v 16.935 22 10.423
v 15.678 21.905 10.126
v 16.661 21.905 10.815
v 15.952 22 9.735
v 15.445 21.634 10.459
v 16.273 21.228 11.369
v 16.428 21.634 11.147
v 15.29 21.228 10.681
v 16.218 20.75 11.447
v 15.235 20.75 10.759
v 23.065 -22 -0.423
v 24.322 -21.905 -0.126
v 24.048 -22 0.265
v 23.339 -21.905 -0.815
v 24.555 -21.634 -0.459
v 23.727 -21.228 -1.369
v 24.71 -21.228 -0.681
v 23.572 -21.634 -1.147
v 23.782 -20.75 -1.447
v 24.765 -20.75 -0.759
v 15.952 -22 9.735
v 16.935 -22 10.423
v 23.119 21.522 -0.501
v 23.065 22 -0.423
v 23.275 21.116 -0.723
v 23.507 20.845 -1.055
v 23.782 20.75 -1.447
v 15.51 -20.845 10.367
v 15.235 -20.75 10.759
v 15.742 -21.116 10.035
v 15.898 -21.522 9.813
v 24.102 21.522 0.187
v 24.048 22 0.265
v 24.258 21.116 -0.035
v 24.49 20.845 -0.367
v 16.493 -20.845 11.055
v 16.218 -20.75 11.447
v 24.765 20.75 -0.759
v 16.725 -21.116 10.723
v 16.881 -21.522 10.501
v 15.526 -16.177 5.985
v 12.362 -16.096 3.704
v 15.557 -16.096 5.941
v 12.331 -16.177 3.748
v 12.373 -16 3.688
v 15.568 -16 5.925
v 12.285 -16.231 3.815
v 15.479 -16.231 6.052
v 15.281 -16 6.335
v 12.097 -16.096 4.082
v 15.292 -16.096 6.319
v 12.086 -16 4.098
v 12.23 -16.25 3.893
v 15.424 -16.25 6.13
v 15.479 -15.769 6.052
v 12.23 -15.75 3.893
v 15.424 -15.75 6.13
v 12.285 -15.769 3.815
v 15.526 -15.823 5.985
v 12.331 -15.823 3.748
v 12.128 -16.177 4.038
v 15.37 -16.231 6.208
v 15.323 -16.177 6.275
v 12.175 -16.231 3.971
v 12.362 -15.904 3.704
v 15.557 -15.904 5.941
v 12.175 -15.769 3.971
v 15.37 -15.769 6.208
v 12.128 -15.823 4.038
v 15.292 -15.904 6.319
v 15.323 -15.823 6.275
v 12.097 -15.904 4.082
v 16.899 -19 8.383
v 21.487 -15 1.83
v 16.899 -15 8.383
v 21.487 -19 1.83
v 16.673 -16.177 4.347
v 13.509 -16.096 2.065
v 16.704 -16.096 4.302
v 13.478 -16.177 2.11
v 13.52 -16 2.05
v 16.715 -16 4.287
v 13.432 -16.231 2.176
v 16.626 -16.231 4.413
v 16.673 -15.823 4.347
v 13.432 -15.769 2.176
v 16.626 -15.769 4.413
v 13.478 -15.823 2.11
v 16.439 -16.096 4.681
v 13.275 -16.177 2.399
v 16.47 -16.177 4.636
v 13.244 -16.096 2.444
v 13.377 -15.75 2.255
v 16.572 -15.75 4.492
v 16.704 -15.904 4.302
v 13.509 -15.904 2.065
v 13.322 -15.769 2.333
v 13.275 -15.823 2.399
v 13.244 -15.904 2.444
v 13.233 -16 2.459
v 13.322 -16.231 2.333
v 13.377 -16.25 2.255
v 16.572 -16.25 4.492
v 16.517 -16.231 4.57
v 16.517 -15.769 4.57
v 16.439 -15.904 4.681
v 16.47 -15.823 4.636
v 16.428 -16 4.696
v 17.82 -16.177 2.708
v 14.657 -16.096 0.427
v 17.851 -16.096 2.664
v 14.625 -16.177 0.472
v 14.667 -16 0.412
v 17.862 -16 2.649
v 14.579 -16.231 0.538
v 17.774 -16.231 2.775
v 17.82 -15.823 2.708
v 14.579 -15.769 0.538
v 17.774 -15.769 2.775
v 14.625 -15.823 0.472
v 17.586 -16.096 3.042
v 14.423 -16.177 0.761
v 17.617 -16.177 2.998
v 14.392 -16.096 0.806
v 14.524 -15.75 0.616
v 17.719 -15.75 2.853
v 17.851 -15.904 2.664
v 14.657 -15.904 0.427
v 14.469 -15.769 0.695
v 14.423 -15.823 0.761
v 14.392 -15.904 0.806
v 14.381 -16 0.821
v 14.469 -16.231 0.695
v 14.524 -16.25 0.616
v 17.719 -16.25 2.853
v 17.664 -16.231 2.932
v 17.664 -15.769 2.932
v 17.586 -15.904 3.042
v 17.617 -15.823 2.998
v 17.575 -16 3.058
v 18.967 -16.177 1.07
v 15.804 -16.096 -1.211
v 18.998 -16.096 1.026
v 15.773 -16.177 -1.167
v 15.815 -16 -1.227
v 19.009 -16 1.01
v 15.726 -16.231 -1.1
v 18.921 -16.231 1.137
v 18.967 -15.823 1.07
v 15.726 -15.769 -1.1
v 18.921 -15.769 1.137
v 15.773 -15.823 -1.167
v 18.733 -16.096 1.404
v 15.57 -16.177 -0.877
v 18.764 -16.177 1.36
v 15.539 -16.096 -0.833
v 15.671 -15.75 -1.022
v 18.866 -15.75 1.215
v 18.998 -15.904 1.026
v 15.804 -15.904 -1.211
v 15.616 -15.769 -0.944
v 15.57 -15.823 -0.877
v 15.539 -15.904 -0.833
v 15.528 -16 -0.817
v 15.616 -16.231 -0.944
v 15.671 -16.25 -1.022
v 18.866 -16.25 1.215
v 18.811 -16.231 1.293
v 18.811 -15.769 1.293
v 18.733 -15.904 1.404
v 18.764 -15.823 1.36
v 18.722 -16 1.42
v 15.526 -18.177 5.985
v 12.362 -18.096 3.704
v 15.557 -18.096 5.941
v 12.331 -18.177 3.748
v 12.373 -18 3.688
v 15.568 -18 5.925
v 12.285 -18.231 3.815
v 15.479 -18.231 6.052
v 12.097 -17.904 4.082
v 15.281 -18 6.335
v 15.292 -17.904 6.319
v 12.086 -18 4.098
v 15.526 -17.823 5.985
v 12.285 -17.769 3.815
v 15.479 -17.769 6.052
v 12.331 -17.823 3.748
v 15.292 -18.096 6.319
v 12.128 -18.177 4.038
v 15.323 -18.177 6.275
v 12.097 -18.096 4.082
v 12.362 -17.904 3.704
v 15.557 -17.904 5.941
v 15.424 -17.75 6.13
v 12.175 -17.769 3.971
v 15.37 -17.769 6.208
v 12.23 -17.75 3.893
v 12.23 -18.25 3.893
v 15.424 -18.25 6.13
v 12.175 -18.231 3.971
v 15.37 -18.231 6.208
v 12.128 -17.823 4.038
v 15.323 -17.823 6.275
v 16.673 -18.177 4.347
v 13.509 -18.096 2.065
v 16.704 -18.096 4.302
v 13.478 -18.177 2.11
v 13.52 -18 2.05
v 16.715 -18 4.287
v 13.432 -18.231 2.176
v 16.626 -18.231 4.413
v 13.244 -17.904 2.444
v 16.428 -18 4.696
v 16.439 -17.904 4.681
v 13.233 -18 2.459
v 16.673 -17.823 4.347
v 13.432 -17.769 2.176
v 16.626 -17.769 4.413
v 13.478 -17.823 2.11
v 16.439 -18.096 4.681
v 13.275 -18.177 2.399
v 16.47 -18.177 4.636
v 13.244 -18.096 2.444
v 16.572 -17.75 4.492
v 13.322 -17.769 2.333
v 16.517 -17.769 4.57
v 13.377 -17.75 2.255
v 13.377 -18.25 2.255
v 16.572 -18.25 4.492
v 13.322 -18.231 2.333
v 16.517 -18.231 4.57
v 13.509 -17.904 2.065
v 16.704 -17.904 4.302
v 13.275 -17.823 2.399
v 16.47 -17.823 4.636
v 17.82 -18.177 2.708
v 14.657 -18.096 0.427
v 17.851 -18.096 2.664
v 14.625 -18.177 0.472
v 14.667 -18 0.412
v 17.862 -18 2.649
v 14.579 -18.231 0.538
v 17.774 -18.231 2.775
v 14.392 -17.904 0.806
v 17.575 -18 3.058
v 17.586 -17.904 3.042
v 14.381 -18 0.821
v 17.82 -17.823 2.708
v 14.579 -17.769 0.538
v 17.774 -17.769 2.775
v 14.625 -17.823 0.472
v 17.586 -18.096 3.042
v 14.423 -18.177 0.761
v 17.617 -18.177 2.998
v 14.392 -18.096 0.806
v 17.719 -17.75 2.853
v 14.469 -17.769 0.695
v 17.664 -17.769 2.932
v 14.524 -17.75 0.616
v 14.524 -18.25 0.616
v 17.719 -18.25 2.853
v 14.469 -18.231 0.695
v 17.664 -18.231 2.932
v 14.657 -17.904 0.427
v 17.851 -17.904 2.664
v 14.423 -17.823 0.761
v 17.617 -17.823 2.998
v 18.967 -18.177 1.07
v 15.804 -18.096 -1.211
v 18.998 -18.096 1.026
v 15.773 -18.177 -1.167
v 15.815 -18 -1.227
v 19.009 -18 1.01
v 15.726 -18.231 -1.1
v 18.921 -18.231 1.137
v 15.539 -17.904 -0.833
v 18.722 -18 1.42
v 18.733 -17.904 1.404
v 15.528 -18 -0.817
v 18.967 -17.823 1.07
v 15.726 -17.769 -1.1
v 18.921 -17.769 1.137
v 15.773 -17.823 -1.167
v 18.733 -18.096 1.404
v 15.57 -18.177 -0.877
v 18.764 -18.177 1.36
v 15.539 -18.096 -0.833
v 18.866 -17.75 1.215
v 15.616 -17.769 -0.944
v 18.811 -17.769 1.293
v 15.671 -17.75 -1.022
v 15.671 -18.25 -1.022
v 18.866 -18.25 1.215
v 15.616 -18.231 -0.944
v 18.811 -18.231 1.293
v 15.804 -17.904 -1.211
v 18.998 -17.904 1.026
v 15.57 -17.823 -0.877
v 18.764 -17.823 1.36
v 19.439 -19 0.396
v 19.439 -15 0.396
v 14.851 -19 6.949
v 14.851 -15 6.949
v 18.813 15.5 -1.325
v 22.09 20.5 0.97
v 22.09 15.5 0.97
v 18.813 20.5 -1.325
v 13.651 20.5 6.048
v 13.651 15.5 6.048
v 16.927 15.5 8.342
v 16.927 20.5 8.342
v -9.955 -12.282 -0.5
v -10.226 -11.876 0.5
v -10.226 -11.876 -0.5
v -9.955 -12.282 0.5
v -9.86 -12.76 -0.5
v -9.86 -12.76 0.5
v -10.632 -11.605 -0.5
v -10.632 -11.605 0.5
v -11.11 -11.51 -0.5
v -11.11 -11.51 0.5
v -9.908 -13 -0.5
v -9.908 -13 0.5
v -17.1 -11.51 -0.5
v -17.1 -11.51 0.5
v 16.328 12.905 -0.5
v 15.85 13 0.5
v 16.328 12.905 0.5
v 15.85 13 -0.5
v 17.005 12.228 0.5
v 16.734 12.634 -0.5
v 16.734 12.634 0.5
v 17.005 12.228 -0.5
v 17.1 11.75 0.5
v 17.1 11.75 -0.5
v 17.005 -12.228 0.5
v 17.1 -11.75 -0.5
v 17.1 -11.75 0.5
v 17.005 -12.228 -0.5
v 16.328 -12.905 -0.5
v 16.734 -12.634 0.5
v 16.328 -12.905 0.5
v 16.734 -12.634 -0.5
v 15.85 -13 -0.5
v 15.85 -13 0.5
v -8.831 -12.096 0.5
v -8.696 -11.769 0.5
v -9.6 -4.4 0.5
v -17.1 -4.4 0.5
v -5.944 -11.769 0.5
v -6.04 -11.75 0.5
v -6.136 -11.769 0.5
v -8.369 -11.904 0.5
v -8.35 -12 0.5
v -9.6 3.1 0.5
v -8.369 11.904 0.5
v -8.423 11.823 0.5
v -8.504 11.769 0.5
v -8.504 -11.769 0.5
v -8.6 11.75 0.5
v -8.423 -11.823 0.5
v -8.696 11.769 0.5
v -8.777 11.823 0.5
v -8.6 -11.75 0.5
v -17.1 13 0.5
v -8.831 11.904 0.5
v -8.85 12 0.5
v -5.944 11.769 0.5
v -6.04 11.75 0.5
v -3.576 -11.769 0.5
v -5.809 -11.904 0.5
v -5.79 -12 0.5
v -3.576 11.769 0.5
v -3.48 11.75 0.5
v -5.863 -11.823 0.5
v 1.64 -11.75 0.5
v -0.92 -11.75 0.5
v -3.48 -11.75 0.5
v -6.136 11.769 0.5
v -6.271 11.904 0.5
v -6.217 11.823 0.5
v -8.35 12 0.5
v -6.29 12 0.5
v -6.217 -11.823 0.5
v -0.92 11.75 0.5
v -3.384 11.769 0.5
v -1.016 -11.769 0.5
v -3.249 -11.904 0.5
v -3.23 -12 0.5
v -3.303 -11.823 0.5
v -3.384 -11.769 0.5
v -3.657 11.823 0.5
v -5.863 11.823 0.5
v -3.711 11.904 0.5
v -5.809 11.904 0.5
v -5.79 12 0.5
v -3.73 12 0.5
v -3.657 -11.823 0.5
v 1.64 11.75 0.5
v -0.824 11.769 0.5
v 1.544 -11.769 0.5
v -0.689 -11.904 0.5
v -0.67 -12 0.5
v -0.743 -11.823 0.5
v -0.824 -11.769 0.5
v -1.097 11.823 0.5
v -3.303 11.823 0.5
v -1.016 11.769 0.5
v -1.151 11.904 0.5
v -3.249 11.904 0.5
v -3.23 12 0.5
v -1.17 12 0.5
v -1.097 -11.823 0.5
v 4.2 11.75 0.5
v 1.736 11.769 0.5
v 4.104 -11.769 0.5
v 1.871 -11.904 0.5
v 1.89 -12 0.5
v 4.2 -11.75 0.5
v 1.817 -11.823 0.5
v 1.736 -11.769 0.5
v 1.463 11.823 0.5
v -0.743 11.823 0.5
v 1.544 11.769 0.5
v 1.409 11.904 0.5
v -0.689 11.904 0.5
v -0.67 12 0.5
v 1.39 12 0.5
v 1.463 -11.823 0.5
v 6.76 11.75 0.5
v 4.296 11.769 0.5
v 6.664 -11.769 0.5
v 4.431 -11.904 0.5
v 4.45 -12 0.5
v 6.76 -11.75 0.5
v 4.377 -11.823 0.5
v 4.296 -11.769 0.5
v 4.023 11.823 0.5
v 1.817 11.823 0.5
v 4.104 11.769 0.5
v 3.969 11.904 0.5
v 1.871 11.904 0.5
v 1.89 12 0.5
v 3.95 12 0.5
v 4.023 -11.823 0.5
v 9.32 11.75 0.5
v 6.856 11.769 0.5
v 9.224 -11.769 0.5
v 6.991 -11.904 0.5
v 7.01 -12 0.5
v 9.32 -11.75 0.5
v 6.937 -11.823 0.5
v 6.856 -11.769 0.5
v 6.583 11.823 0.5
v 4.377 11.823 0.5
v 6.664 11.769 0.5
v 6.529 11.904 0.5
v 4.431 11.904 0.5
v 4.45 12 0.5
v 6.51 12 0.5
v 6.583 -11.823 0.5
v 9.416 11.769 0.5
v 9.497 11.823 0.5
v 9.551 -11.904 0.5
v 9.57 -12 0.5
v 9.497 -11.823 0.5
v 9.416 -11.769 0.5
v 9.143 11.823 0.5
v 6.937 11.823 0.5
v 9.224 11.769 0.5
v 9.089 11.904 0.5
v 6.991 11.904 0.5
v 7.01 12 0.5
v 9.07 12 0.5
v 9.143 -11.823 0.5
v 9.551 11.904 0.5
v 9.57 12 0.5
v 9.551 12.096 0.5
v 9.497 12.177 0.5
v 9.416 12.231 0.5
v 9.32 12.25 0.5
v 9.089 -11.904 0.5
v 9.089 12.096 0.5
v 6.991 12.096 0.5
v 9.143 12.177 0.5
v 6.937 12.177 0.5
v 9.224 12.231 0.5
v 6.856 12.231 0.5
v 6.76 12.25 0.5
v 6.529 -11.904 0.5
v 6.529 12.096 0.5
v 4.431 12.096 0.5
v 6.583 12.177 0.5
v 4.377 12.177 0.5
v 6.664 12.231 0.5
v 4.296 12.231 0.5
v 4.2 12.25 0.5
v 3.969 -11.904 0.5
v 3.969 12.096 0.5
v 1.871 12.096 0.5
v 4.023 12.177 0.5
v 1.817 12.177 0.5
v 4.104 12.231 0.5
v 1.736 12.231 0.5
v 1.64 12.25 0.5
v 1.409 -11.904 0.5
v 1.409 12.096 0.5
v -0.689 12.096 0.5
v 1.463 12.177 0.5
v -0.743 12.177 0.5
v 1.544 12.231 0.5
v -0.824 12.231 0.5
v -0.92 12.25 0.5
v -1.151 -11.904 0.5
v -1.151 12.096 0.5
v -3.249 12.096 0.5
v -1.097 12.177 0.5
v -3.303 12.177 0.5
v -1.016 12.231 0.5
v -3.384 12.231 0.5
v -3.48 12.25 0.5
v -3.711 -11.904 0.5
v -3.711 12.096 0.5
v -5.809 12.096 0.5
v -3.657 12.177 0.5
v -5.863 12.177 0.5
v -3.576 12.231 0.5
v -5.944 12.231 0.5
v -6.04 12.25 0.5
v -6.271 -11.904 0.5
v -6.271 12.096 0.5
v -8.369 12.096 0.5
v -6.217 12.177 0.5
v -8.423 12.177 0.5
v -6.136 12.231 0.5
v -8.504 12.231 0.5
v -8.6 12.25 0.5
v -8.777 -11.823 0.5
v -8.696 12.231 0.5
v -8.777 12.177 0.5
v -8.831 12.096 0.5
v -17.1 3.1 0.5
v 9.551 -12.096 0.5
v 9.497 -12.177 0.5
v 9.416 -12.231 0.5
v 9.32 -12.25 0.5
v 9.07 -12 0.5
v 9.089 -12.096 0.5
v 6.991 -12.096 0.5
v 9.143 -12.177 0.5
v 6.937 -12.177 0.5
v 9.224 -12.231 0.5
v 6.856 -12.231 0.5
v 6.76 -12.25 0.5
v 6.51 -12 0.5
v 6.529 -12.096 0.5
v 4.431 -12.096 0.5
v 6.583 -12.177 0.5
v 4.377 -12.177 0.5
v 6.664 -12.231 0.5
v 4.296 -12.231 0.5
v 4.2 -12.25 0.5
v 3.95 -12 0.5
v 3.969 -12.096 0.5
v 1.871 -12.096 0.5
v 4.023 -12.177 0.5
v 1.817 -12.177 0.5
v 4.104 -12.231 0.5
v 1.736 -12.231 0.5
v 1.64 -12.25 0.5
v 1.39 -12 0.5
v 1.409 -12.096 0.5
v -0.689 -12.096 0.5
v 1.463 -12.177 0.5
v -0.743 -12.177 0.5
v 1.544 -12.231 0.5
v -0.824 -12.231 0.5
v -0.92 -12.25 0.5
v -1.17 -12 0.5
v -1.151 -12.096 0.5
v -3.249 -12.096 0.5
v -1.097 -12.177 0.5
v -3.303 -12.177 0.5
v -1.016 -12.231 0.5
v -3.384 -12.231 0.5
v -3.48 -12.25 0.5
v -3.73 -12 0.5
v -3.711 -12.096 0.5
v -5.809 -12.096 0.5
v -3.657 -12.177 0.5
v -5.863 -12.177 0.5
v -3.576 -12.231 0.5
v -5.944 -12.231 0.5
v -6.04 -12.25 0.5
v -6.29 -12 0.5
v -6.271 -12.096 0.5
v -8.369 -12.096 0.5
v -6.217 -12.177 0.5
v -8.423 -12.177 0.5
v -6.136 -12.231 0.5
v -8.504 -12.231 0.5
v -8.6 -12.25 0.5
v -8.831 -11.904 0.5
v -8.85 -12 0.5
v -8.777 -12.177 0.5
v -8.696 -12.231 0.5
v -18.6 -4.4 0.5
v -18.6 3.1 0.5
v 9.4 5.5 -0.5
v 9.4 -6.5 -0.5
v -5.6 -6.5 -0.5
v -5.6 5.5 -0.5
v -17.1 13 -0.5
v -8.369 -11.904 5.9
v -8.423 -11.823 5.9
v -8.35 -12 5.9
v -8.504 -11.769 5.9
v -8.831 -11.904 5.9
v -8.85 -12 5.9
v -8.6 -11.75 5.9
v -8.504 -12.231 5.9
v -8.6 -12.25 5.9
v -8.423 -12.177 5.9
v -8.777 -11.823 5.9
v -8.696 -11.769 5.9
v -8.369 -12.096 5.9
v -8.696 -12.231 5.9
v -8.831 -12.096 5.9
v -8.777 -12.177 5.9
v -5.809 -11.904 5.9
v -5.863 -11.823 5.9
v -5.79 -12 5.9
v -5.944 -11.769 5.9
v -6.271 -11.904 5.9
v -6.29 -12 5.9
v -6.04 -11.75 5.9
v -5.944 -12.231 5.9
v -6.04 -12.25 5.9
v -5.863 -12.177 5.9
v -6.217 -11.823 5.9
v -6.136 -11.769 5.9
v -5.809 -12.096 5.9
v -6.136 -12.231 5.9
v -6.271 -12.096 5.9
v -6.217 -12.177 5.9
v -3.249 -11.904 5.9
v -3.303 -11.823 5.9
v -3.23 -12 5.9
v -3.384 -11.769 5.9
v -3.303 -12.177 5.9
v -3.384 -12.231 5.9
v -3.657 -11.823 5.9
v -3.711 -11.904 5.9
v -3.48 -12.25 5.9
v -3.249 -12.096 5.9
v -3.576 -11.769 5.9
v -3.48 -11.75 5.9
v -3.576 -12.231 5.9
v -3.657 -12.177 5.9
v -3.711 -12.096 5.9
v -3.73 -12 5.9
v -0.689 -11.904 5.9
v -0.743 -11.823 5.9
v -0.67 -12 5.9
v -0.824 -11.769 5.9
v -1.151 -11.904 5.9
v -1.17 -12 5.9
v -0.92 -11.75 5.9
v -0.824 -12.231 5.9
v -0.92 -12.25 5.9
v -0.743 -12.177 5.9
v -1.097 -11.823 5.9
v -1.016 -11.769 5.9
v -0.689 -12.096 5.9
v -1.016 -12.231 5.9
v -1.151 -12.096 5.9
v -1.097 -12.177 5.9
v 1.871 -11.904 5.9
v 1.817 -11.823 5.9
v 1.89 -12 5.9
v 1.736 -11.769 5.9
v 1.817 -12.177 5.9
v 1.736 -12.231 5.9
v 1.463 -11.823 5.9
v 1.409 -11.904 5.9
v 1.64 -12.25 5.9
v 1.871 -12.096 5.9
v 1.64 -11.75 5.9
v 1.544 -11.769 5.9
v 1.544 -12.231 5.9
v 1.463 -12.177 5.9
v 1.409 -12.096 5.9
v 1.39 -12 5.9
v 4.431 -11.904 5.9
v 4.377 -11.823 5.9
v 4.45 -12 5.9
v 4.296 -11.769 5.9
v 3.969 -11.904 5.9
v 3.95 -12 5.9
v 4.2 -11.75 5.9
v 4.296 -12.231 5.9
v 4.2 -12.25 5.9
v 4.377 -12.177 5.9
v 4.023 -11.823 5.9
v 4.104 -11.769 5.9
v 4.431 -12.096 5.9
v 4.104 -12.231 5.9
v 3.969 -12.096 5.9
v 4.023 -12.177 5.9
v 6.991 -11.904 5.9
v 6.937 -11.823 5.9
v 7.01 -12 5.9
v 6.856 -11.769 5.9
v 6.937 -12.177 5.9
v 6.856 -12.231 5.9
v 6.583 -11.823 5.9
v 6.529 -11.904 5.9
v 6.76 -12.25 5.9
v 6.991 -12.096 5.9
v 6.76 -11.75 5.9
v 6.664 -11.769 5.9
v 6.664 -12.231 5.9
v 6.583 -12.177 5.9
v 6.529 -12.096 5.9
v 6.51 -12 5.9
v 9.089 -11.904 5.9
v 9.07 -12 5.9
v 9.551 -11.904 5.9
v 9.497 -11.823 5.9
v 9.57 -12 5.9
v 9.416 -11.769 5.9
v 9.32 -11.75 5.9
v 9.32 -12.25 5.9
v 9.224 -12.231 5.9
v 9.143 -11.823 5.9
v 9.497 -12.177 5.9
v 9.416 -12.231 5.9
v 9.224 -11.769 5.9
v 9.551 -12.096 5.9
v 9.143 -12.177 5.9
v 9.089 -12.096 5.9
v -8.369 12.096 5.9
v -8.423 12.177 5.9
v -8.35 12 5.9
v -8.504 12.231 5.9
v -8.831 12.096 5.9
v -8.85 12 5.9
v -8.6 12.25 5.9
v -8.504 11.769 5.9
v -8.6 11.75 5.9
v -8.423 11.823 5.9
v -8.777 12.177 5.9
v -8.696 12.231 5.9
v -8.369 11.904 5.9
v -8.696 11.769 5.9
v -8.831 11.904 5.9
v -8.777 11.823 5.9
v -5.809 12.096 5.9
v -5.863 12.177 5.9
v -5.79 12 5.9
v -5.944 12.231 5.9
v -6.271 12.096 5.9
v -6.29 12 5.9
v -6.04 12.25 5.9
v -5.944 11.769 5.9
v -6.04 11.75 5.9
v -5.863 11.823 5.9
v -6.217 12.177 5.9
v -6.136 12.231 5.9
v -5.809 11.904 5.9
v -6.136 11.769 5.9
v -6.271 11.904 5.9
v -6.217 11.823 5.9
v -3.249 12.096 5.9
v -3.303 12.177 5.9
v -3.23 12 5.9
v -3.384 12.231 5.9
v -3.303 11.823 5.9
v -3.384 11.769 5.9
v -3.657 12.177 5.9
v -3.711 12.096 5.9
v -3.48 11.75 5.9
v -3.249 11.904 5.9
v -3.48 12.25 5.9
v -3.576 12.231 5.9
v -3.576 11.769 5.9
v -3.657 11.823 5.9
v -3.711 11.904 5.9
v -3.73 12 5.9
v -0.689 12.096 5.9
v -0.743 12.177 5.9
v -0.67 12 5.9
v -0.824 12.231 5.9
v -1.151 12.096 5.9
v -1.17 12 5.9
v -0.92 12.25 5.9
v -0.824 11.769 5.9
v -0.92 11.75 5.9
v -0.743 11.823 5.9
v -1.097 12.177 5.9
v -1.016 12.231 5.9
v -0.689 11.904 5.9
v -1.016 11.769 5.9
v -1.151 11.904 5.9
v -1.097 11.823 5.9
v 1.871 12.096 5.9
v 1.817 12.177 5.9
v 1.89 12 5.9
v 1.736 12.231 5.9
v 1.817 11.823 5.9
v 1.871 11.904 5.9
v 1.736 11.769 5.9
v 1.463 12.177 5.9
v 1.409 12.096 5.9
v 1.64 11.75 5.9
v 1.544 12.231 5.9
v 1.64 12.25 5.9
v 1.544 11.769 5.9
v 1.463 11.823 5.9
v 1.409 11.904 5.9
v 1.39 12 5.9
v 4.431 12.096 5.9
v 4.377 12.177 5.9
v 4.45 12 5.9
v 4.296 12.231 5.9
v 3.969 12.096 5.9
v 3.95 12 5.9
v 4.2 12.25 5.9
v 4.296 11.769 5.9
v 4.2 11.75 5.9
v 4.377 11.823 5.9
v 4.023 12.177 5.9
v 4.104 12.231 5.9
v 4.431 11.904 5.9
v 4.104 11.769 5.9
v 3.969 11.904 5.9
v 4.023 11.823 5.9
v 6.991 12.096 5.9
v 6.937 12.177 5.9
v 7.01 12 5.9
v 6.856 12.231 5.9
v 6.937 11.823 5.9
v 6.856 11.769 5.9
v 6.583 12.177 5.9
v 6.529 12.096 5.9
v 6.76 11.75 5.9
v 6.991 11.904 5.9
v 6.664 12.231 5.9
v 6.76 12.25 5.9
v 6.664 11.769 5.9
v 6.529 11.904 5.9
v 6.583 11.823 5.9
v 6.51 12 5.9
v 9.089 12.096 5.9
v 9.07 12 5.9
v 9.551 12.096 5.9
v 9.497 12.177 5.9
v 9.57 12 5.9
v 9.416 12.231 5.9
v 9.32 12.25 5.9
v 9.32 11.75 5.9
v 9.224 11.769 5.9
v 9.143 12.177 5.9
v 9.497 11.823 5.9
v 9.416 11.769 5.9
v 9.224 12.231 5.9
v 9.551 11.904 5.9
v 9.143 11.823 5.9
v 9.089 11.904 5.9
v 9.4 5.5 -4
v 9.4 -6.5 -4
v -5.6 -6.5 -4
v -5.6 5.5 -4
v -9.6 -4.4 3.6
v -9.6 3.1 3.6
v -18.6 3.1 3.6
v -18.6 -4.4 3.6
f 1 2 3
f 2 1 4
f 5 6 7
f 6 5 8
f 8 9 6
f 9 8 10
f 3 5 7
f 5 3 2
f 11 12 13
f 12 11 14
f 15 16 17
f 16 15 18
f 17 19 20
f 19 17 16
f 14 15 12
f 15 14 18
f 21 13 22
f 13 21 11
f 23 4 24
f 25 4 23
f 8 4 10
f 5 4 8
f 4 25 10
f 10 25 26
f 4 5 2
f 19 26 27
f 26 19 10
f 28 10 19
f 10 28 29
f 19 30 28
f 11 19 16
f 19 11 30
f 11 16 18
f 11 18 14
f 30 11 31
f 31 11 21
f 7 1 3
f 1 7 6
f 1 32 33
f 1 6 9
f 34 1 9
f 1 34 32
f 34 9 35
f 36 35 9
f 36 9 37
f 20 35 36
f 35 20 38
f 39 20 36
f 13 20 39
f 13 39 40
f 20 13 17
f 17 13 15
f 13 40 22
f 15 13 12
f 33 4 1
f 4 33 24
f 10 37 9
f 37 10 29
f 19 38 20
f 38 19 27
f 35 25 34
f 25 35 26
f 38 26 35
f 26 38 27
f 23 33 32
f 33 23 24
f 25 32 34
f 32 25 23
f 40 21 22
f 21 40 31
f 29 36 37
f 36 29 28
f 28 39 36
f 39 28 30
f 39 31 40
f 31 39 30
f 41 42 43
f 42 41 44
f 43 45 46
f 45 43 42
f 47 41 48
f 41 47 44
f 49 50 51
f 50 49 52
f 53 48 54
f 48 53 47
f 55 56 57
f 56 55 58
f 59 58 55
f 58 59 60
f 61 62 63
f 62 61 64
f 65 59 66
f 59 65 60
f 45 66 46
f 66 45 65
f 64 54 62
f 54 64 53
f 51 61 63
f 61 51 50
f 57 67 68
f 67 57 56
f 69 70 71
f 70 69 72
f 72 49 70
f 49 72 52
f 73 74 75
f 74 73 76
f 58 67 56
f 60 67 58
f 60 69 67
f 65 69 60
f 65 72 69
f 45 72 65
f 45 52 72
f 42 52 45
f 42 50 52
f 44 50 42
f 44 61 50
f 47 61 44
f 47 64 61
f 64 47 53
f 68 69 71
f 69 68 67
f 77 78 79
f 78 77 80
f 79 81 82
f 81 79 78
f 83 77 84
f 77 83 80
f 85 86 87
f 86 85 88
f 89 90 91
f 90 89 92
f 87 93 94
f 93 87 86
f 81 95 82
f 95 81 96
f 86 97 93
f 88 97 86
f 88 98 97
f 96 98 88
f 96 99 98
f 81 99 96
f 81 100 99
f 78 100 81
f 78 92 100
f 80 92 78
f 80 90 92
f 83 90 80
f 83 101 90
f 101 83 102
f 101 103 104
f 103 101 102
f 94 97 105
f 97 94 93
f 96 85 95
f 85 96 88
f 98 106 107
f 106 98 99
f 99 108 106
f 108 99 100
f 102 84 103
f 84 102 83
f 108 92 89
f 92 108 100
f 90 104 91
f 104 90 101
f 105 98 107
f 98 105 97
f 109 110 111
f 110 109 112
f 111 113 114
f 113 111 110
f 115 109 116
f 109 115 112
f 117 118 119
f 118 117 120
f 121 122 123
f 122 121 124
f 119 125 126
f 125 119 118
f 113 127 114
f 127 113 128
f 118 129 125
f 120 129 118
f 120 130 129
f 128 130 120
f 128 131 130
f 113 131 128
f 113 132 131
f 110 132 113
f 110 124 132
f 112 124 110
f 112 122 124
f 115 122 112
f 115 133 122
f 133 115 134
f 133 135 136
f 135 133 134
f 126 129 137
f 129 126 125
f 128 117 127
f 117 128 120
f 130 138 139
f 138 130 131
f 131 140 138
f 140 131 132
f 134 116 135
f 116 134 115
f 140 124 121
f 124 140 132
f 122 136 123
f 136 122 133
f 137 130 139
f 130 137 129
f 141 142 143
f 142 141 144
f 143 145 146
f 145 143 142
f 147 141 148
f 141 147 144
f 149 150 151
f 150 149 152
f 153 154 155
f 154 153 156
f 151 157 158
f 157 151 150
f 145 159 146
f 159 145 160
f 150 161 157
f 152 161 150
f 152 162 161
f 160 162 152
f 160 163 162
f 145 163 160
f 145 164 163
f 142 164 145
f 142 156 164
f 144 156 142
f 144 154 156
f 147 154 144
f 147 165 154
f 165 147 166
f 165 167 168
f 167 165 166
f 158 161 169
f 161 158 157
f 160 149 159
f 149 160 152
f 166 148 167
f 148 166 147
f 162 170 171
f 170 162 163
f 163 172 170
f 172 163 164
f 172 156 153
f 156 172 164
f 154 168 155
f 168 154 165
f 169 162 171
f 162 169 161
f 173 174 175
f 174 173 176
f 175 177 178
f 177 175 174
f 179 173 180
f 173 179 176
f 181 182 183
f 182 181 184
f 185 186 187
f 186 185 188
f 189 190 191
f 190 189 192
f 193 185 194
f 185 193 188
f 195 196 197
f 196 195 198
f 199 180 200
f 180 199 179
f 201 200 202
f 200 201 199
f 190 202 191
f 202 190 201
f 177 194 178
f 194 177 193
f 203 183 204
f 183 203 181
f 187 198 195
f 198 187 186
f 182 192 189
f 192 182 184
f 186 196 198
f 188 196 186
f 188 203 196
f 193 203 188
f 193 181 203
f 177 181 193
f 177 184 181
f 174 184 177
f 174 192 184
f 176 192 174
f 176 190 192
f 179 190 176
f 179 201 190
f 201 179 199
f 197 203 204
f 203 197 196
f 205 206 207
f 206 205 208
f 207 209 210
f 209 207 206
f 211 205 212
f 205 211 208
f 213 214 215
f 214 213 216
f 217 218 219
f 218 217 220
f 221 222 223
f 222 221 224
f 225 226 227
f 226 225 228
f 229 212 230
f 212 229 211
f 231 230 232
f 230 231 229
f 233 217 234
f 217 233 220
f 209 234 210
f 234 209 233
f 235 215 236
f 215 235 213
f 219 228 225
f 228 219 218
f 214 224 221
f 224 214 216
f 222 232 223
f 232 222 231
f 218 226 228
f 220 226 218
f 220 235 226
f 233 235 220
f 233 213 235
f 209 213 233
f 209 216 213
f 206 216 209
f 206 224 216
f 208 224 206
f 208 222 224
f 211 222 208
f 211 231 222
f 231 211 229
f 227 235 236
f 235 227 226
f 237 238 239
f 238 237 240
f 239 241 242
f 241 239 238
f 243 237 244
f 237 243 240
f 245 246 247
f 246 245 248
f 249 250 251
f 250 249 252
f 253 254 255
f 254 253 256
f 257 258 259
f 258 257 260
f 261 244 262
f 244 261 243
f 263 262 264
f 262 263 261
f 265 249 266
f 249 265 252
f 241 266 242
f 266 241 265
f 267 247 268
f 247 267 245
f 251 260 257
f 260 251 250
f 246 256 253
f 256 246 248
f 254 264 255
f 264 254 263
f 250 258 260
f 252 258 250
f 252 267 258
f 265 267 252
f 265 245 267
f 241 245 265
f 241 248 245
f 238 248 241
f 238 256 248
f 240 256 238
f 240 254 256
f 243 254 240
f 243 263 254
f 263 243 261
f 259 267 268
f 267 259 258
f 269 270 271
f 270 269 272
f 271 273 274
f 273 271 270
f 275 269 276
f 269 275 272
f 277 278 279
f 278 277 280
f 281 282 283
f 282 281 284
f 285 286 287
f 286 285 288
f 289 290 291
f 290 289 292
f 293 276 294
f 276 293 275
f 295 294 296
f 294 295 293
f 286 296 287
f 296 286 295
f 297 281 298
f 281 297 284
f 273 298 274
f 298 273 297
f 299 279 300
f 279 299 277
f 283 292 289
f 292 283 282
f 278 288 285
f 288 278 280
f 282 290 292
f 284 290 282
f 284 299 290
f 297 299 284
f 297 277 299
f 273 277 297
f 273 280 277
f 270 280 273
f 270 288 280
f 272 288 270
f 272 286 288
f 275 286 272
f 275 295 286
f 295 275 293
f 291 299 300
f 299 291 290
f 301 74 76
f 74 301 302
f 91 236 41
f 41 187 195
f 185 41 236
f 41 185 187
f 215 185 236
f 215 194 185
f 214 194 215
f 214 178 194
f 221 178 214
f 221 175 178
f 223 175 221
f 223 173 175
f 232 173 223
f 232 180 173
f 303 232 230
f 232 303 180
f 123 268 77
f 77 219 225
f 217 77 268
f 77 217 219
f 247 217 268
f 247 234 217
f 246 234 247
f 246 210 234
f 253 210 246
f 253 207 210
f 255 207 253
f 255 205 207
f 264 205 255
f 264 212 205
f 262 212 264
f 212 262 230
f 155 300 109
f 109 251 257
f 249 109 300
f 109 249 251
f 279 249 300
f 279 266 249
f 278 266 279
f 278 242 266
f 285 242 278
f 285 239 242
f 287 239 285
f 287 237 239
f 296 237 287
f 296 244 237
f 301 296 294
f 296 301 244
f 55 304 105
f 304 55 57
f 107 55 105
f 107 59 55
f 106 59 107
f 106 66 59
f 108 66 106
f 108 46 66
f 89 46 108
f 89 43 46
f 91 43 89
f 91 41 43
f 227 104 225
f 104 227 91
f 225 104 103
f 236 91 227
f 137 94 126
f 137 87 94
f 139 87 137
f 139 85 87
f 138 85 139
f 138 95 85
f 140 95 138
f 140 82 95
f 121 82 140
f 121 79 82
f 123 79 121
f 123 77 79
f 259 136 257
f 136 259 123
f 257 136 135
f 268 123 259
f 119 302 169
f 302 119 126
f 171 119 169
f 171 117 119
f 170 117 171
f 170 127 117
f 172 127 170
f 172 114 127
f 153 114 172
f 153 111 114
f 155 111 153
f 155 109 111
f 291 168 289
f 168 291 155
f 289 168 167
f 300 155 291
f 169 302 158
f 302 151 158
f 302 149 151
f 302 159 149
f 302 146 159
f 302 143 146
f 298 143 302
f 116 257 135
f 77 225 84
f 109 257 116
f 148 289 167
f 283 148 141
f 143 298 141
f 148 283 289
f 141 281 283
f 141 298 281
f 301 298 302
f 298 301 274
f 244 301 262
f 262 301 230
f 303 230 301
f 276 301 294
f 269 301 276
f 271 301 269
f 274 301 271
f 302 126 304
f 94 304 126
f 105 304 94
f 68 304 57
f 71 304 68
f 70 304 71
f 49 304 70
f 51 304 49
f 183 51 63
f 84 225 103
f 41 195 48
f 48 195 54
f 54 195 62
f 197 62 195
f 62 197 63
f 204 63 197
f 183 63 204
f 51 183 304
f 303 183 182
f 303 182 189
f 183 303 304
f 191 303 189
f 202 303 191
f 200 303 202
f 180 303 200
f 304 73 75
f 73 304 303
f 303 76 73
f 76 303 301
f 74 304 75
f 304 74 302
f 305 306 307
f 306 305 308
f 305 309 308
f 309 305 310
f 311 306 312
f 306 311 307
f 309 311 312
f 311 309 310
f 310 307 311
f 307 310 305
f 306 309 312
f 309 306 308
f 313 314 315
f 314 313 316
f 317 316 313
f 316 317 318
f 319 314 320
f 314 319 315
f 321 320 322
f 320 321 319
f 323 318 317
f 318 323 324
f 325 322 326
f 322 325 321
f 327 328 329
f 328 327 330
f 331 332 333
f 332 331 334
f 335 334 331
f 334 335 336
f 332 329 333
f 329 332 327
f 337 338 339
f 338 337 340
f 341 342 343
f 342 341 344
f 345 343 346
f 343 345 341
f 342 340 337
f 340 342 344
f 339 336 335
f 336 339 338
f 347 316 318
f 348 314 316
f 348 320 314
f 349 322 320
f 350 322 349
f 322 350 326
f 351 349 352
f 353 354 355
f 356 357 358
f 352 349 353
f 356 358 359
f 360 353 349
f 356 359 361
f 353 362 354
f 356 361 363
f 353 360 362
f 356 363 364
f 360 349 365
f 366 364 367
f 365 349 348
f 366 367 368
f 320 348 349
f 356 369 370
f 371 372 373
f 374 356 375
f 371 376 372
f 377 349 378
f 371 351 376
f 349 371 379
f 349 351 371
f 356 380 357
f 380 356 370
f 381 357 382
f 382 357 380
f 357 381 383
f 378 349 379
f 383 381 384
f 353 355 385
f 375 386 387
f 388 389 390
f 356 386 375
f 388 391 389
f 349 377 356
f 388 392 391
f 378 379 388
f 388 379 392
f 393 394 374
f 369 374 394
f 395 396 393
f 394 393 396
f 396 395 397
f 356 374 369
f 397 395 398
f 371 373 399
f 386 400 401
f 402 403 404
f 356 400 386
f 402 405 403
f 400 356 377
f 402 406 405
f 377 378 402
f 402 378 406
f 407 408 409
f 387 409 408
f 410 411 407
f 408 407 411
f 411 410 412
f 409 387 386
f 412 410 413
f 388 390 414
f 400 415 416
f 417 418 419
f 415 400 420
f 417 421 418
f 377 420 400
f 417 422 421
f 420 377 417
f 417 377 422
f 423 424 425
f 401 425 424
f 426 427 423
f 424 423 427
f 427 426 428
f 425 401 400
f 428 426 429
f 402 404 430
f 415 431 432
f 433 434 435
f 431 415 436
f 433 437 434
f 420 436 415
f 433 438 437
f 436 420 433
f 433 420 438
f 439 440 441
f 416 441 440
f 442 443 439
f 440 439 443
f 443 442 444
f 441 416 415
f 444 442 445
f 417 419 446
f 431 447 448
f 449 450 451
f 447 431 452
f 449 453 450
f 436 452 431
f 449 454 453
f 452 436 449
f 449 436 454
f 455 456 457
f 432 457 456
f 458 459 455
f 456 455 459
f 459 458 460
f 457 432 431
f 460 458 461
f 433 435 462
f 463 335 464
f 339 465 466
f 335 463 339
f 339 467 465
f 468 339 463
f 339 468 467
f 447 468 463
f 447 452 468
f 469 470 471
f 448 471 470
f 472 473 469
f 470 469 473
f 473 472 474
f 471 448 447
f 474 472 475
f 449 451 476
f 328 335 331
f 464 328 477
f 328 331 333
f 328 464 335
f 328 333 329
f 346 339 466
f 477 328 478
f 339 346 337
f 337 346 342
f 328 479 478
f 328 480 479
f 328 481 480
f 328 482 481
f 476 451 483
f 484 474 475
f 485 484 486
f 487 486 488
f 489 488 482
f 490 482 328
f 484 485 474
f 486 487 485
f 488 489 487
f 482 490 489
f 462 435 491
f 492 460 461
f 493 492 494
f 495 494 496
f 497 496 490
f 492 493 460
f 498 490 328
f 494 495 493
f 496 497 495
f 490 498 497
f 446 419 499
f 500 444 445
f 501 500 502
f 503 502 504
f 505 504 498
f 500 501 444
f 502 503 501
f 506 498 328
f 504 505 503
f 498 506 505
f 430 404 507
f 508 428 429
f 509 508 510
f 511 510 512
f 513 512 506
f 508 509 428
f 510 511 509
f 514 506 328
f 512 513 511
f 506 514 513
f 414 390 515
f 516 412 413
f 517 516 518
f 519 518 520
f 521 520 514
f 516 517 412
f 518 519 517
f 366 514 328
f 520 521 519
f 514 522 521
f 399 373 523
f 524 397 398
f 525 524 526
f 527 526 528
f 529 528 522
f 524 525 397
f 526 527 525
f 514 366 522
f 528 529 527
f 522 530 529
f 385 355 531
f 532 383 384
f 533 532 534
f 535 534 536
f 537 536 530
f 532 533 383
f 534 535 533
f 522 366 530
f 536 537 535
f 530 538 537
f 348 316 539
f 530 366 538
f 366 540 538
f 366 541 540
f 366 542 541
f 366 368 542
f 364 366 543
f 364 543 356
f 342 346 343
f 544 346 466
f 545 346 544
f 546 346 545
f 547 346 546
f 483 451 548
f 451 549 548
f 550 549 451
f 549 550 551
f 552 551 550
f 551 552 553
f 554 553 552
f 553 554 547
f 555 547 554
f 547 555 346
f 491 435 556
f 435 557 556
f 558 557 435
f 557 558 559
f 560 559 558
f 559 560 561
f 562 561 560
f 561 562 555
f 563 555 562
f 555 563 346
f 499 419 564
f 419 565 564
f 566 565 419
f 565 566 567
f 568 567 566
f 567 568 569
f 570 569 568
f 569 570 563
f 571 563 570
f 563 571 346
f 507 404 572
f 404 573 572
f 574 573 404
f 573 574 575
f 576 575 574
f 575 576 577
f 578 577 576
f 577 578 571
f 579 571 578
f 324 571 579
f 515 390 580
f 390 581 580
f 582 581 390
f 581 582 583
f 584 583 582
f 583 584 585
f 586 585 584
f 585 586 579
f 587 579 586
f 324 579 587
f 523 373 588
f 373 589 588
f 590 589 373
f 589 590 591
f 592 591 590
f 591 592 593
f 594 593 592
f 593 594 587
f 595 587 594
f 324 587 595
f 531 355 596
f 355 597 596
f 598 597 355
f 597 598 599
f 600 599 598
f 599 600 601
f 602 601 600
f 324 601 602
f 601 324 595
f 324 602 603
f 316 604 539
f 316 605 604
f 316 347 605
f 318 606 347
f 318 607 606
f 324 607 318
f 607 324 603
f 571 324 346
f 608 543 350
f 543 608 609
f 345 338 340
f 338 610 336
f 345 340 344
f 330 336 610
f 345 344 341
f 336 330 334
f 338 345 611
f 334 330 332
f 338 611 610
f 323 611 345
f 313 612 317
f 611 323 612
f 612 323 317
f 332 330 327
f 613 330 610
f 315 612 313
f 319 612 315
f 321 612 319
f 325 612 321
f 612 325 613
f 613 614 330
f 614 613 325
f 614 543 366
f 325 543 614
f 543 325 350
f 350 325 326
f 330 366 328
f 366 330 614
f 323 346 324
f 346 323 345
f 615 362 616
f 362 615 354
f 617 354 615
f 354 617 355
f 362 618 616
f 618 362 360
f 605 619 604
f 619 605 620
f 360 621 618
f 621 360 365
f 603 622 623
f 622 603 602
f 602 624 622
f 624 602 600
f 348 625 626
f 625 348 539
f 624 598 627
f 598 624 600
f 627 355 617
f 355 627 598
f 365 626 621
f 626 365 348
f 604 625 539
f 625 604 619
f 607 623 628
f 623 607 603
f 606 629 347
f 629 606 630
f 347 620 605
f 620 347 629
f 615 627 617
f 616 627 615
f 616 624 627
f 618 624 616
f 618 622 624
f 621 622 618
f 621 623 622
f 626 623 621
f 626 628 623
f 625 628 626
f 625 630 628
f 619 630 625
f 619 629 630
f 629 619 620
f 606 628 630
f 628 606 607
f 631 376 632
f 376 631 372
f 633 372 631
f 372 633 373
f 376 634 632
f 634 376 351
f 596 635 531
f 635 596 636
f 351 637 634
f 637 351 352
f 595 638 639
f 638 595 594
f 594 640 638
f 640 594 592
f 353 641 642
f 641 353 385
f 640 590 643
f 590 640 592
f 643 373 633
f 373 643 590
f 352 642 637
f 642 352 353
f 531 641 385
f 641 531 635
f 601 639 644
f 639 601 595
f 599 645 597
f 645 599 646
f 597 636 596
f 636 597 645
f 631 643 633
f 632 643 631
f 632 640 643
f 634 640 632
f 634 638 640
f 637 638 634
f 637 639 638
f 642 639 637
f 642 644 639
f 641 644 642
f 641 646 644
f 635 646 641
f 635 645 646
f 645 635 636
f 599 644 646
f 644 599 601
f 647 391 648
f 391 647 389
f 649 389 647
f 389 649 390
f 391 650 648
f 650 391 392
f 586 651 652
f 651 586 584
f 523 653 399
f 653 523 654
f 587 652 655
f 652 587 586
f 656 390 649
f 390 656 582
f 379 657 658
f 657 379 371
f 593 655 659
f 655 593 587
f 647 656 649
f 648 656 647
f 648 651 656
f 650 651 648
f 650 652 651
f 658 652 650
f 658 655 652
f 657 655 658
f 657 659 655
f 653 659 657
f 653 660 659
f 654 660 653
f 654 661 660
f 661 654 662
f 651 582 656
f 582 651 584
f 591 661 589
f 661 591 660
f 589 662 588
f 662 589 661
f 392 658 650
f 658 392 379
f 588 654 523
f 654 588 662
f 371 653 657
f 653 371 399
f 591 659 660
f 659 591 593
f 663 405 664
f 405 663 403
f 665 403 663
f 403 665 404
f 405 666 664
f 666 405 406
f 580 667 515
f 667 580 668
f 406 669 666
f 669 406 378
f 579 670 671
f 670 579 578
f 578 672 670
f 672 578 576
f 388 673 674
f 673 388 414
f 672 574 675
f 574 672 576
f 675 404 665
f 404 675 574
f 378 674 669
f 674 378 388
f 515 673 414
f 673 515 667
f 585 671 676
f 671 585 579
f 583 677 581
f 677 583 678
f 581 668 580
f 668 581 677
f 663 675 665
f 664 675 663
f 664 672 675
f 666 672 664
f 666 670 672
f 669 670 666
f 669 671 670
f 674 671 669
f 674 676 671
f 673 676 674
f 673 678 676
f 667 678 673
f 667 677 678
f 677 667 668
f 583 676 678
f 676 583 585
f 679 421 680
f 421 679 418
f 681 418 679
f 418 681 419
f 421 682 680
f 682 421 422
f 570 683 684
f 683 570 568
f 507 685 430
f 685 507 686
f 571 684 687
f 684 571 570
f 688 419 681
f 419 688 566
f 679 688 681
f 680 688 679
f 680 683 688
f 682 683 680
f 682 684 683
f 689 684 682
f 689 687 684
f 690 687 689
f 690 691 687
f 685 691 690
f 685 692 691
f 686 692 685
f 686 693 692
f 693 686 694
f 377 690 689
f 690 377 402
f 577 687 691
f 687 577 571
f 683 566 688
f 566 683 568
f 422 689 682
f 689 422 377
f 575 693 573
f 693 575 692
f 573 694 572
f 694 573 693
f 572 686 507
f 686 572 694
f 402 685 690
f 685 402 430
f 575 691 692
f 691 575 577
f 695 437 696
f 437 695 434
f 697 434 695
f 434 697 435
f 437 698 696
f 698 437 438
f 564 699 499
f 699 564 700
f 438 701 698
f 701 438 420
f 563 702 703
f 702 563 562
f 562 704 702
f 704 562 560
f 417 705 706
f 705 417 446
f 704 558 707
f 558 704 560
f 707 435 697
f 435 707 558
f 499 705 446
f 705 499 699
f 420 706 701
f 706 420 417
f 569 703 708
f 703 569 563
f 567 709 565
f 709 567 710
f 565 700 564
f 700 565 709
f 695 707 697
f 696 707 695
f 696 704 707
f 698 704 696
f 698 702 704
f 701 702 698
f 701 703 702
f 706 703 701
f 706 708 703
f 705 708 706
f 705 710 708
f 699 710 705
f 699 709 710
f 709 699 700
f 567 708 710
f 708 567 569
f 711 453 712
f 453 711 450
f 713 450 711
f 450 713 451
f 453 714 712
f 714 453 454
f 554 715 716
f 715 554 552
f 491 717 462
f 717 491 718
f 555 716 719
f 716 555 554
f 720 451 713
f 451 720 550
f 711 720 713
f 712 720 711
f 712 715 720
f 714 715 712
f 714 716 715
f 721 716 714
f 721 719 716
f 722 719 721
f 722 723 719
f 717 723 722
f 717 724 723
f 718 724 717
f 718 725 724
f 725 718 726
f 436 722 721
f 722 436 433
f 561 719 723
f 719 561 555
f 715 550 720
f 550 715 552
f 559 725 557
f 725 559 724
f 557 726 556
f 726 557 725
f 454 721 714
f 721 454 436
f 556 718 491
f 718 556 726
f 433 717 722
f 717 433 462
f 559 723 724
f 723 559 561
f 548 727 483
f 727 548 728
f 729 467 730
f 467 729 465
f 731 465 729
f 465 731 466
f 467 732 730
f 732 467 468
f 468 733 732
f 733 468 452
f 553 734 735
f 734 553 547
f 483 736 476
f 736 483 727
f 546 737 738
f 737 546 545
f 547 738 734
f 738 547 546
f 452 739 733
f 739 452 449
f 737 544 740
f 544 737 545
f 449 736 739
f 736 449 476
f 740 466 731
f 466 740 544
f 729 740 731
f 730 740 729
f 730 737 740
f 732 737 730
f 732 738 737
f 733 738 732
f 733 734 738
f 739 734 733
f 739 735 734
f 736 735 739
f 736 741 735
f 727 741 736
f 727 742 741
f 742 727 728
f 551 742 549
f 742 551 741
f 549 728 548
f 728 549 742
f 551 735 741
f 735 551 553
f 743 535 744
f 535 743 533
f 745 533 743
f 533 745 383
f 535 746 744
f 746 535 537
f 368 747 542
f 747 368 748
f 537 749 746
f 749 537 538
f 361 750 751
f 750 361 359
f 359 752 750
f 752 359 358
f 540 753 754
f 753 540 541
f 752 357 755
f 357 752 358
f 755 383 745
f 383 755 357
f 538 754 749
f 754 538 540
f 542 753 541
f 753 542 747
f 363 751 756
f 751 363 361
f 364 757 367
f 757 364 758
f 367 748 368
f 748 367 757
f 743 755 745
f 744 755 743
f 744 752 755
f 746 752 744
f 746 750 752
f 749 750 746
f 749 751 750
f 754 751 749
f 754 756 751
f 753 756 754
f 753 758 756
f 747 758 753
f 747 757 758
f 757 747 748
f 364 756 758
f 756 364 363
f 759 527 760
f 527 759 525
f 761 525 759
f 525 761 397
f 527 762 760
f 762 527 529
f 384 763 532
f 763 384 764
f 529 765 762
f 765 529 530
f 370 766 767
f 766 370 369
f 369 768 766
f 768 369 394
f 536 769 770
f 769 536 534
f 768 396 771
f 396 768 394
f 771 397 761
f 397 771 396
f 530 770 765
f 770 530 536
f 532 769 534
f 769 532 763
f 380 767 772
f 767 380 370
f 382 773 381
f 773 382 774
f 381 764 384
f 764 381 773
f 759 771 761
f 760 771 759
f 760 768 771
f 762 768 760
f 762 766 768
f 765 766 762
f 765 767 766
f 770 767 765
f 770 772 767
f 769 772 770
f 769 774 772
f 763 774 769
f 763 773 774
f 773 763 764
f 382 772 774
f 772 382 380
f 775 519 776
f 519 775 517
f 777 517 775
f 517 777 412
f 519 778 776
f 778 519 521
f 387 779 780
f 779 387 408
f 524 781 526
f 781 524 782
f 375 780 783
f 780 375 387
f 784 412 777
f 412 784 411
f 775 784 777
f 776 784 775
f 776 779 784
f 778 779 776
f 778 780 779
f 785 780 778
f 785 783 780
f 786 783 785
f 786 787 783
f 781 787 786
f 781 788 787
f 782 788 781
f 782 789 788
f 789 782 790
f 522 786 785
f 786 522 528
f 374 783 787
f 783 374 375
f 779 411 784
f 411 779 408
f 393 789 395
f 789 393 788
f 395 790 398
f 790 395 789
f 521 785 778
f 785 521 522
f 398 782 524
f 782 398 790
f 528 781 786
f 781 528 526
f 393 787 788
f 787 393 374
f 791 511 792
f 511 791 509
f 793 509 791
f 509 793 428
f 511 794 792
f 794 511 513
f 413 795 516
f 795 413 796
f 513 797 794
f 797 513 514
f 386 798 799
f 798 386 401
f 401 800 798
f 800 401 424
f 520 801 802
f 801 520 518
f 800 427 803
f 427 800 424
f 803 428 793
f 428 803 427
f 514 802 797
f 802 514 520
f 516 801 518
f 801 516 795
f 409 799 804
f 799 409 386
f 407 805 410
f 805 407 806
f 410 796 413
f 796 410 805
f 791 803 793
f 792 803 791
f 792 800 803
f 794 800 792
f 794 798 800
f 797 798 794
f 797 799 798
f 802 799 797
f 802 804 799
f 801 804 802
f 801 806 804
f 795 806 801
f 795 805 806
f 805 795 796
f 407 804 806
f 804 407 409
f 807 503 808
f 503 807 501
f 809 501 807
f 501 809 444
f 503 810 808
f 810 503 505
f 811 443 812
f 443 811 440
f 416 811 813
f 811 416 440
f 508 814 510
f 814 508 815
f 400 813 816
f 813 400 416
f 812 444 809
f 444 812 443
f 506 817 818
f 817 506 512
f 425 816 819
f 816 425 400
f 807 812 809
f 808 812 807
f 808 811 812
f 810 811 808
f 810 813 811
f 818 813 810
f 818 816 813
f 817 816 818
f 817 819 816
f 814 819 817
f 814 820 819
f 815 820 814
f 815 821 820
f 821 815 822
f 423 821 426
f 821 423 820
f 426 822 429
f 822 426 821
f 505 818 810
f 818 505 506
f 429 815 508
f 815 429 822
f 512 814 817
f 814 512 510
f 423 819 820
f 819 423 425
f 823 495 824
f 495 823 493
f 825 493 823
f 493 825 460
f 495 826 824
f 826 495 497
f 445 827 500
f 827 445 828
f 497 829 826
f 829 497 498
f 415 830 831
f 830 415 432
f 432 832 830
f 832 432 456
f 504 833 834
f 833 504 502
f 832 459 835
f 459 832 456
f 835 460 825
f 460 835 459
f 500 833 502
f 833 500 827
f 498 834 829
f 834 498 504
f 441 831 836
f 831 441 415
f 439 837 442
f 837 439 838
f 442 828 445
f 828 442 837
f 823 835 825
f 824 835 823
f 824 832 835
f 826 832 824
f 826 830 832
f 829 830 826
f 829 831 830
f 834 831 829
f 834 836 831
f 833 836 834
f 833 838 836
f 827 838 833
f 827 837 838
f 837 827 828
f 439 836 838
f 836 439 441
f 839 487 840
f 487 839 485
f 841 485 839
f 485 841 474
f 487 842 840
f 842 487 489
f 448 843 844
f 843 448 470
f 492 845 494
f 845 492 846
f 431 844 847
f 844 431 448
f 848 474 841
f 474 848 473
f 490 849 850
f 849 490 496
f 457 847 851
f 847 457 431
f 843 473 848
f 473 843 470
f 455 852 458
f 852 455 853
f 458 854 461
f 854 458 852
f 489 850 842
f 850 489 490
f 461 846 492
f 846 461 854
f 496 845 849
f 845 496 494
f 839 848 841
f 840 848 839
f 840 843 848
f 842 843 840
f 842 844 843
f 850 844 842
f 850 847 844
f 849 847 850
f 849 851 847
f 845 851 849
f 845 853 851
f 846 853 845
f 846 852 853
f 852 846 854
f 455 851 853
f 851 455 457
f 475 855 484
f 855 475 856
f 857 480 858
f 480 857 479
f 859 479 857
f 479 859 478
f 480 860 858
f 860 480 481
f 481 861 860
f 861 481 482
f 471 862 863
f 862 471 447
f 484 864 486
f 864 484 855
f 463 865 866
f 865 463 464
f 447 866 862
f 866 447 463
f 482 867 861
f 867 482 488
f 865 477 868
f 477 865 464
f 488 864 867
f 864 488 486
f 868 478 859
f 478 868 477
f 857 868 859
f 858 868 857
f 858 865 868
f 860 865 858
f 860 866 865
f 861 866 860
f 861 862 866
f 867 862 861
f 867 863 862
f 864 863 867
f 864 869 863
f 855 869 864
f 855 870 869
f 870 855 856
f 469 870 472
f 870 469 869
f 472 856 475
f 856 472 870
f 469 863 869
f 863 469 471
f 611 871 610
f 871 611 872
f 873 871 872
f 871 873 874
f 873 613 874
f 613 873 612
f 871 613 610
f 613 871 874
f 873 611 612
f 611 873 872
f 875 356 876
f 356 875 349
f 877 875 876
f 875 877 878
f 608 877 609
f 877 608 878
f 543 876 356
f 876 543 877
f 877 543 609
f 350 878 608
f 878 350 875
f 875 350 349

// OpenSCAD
// file: d1mini.scad
module d1mini(center = false) {
  rastermass = 2.56;

  board_length = 34.2;
  board_width = 26;
  board_thickness = 1;

  centerx = center ? -board_length / 2 : 0;
  centery = center ? -board_width / 2 : 0;
  centerz = center ? -board_thickness / 2 : 0;
  translate([centerx, centery, centerz]) {
    difference() {
      // board
      cube([board_length, board_width, board_thickness]);
      // long hole
      translate([-0.01, -0.01, -board_thickness]) {
        translate([6, 0.1*hole_diameter, 0]) cylinder(h = 3*board_thickness, d = hole_diameter);
        cube([6, 0.6*hole_diameter, 3*board_thickness]);
      }
      // corner cut right top
      translate([board_length, board_width, 0]) rotate([0, 0, 180]) {
        translate([hole_diameter*0.5, hole_diameter*0.5, 0]) difference() {
          translate([-2*hole_diameter, -2*hole_diameter, -board_thickness]) cube([2*hole_diameter, 2*hole_diameter, 3*board_thickness]);
          translate([0, 0, -2*board_thickness]) cylinder(h = 5*board_thickness, d = hole_diameter);
        }
      }
      // corner cut right bottom
      translate([board_length, 0, 0]) rotate([0, 0, 90]) {
        translate([hole_diameter*0.5, hole_diameter*0.5, 0]) difference() {
          translate([-2*hole_diameter, -2*hole_diameter, -board_thickness]) cube([2*hole_diameter, 2*hole_diameter, 3*board_thickness]);
          translate([0, 0, -2*board_thickness]) cylinder(h = 5*board_thickness, d = hole_diameter);
        }
      }
    }
    // esp
    translate([11.5, 6.5, -3.5]) cube([15, 12, 3.5]);
    // usbc
    translate([-1.5, 8.6, board_thickness]) cube([9, 7.5, 3.1]);
    // pins bottom
    translate([8.5, 1, 0]) {
      translate([0 * rastermass, 0 * rastermass, 0]) cylinder(h = pin_height, d = pin_diameter);
      translate([1 * rastermass, 0 * rastermass, 0]) cylinder(h = pin_height, d = pin_diameter);
      translate([2 * rastermass, 0 * rastermass, 0]) cylinder(h = pin_height, d = pin_diameter);
      translate([3 * rastermass, 0 * rastermass, 0]) cylinder(h = pin_height, d = pin_diameter);
      translate([4 * rastermass, 0 * rastermass, 0]) cylinder(h = pin_height, d = pin_diameter);
      translate([5 * rastermass, 0 * rastermass, 0]) cylinder(h = pin_height, d = pin_diameter);
      translate([6 * rastermass, 0 * rastermass, 0]) cylinder(h = pin_height, d = pin_diameter);
      translate([7 * rastermass, 0 * rastermass, 0]) cylinder(h = pin_height, d = pin_diameter);
    }
    // pins top
    translate([8.5, board_width - 1, 0]) {
      translate([0 * rastermass, 0 * rastermass, 0]) cylinder(h = pin_height, d = pin_diameter);
      translate([1 * rastermass, 0 * rastermass, 0]) cylinder(h = pin_height, d = pin_diameter);
      translate([2 * rastermass, 0 * rastermass, 0]) cylinder(h = pin_height, d = pin_diameter);
      translate([3 * rastermass, 0 * rastermass, 0]) cylinder(h = pin_height, d = pin_diameter);
      translate([4 * rastermass, 0 * rastermass, 0]) cylinder(h = pin_height, d = pin_diameter);
      translate([5 * rastermass, 0 * rastermass, 0]) cylinder(h = pin_height, d = pin_diameter);
      translate([6 * rastermass, 0 * rastermass, 0]) cylinder(h = pin_height, d = pin_diameter);
      translate([7 * rastermass, 0 * rastermass, 0]) cylinder(h = pin_height, d = pin_diameter);
    }
  }
}
// file: ld2450.scad
board_length = 44;
board_width = 14.9;
board_thickness = 1.2;

hole_diameter = 2.5;

connector_width = 9;
connector_depth = 5;
connector_height = 4;

pin_diameter = 0.5;
pin_height = 6.4;

pin_box_width = 8;
pin_box_depth = 4;
pin_box_height = 2.5;

rastermass = 2;

module ld2450(altitude = 0, center = false) {
  centerx = center ? -board_length / 2 : 0;
  centery = center ? -board_width / 2 : 0;
  centerz = center ? -board_thickness / 2 : 0;
  rotate([altitude, 0, 0]) translate([centerx, centery, centerz]) {
    // board with holes
    difference() {
      // board
      cube([board_length, board_width, board_thickness]);
      // holes
      translate([0, 0, -board_thickness]) cylinder(h = 3*board_thickness, d = hole_diameter);
      translate([board_length, board_width, -board_thickness]) cylinder(h = 3*board_thickness, d = hole_diameter);
      // corner cut left top
      translate([0, board_width, 0]) rotate([0, 0, -90]) {
        translate([hole_diameter*0.5, hole_diameter*0.5, 0]) difference() {
          translate([-2*hole_diameter, -2*hole_diameter, -board_thickness]) cube([2*hole_diameter, 2*hole_diameter, 3*board_thickness]);
          translate([0, 0, -2*board_thickness]) cylinder(h = 5*board_thickness, d = hole_diameter);
        }
      }
      // corner cut right bottom
      translate([board_length, 0, 0]) rotate([0, 0, 90]) {
        translate([hole_diameter*0.5, hole_diameter*0.5, 0]) difference() {
          translate([-2*hole_diameter, -2*hole_diameter, -board_thickness]) cube([2*hole_diameter, 2*hole_diameter, 3*board_thickness]);
          translate([0, 0, -2*board_thickness]) cylinder(h = 5*board_thickness, d = hole_diameter);
        }
      }
    }
    // stuff thats on the board
    translate([0, 0, board_thickness]) {
      // connector box
      translate([1.5, connector_width + (board_width - connector_width)/2, 0]) rotate([0, 0, -90]) cube([connector_width, connector_depth, connector_height]);
      // pins with box
      translate([board_length - pin_box_depth - 3, pin_box_width + 4, 0]) rotate([0, 0, -90]) {
        // pin cube
        cube([pin_box_width, pin_box_depth, pin_box_height]);
        translate([rastermass*0.5, rastermass*0.5, 0]) {
          // pins
          translate([0 * rastermass, 0 * rastermass, 0]) cylinder(h = pin_height, d = pin_diameter);
          translate([1 * rastermass, 0 * rastermass, 0]) cylinder(h = pin_height, d = pin_diameter);
          translate([2 * rastermass, 0 * rastermass, 0]) cylinder(h = pin_height, d = pin_diameter);
          translate([3 * rastermass, 0 * rastermass, 0]) cylinder(h = pin_height, d = pin_diameter);
          translate([0 * rastermass, 1 * rastermass, 0]) cylinder(h = pin_height, d = pin_diameter);
          translate([1 * rastermass, 1 * rastermass, 0]) cylinder(h = pin_height, d = pin_diameter);
          translate([2 * rastermass, 1 * rastermass, 0]) cylinder(h = pin_height, d = pin_diameter);
          translate([3 * rastermass, 1 * rastermass, 0]) cylinder(h = pin_height, d = pin_diameter);
        }
      }
    }
  }
}
// main file
$fn = 16;

include <ld2450.scad>
include <d1mini.scad>

translate([20, 0, 5]) rotate([90+35, 0, -90]) ld2450(center = true);
d1mini(center = true);
